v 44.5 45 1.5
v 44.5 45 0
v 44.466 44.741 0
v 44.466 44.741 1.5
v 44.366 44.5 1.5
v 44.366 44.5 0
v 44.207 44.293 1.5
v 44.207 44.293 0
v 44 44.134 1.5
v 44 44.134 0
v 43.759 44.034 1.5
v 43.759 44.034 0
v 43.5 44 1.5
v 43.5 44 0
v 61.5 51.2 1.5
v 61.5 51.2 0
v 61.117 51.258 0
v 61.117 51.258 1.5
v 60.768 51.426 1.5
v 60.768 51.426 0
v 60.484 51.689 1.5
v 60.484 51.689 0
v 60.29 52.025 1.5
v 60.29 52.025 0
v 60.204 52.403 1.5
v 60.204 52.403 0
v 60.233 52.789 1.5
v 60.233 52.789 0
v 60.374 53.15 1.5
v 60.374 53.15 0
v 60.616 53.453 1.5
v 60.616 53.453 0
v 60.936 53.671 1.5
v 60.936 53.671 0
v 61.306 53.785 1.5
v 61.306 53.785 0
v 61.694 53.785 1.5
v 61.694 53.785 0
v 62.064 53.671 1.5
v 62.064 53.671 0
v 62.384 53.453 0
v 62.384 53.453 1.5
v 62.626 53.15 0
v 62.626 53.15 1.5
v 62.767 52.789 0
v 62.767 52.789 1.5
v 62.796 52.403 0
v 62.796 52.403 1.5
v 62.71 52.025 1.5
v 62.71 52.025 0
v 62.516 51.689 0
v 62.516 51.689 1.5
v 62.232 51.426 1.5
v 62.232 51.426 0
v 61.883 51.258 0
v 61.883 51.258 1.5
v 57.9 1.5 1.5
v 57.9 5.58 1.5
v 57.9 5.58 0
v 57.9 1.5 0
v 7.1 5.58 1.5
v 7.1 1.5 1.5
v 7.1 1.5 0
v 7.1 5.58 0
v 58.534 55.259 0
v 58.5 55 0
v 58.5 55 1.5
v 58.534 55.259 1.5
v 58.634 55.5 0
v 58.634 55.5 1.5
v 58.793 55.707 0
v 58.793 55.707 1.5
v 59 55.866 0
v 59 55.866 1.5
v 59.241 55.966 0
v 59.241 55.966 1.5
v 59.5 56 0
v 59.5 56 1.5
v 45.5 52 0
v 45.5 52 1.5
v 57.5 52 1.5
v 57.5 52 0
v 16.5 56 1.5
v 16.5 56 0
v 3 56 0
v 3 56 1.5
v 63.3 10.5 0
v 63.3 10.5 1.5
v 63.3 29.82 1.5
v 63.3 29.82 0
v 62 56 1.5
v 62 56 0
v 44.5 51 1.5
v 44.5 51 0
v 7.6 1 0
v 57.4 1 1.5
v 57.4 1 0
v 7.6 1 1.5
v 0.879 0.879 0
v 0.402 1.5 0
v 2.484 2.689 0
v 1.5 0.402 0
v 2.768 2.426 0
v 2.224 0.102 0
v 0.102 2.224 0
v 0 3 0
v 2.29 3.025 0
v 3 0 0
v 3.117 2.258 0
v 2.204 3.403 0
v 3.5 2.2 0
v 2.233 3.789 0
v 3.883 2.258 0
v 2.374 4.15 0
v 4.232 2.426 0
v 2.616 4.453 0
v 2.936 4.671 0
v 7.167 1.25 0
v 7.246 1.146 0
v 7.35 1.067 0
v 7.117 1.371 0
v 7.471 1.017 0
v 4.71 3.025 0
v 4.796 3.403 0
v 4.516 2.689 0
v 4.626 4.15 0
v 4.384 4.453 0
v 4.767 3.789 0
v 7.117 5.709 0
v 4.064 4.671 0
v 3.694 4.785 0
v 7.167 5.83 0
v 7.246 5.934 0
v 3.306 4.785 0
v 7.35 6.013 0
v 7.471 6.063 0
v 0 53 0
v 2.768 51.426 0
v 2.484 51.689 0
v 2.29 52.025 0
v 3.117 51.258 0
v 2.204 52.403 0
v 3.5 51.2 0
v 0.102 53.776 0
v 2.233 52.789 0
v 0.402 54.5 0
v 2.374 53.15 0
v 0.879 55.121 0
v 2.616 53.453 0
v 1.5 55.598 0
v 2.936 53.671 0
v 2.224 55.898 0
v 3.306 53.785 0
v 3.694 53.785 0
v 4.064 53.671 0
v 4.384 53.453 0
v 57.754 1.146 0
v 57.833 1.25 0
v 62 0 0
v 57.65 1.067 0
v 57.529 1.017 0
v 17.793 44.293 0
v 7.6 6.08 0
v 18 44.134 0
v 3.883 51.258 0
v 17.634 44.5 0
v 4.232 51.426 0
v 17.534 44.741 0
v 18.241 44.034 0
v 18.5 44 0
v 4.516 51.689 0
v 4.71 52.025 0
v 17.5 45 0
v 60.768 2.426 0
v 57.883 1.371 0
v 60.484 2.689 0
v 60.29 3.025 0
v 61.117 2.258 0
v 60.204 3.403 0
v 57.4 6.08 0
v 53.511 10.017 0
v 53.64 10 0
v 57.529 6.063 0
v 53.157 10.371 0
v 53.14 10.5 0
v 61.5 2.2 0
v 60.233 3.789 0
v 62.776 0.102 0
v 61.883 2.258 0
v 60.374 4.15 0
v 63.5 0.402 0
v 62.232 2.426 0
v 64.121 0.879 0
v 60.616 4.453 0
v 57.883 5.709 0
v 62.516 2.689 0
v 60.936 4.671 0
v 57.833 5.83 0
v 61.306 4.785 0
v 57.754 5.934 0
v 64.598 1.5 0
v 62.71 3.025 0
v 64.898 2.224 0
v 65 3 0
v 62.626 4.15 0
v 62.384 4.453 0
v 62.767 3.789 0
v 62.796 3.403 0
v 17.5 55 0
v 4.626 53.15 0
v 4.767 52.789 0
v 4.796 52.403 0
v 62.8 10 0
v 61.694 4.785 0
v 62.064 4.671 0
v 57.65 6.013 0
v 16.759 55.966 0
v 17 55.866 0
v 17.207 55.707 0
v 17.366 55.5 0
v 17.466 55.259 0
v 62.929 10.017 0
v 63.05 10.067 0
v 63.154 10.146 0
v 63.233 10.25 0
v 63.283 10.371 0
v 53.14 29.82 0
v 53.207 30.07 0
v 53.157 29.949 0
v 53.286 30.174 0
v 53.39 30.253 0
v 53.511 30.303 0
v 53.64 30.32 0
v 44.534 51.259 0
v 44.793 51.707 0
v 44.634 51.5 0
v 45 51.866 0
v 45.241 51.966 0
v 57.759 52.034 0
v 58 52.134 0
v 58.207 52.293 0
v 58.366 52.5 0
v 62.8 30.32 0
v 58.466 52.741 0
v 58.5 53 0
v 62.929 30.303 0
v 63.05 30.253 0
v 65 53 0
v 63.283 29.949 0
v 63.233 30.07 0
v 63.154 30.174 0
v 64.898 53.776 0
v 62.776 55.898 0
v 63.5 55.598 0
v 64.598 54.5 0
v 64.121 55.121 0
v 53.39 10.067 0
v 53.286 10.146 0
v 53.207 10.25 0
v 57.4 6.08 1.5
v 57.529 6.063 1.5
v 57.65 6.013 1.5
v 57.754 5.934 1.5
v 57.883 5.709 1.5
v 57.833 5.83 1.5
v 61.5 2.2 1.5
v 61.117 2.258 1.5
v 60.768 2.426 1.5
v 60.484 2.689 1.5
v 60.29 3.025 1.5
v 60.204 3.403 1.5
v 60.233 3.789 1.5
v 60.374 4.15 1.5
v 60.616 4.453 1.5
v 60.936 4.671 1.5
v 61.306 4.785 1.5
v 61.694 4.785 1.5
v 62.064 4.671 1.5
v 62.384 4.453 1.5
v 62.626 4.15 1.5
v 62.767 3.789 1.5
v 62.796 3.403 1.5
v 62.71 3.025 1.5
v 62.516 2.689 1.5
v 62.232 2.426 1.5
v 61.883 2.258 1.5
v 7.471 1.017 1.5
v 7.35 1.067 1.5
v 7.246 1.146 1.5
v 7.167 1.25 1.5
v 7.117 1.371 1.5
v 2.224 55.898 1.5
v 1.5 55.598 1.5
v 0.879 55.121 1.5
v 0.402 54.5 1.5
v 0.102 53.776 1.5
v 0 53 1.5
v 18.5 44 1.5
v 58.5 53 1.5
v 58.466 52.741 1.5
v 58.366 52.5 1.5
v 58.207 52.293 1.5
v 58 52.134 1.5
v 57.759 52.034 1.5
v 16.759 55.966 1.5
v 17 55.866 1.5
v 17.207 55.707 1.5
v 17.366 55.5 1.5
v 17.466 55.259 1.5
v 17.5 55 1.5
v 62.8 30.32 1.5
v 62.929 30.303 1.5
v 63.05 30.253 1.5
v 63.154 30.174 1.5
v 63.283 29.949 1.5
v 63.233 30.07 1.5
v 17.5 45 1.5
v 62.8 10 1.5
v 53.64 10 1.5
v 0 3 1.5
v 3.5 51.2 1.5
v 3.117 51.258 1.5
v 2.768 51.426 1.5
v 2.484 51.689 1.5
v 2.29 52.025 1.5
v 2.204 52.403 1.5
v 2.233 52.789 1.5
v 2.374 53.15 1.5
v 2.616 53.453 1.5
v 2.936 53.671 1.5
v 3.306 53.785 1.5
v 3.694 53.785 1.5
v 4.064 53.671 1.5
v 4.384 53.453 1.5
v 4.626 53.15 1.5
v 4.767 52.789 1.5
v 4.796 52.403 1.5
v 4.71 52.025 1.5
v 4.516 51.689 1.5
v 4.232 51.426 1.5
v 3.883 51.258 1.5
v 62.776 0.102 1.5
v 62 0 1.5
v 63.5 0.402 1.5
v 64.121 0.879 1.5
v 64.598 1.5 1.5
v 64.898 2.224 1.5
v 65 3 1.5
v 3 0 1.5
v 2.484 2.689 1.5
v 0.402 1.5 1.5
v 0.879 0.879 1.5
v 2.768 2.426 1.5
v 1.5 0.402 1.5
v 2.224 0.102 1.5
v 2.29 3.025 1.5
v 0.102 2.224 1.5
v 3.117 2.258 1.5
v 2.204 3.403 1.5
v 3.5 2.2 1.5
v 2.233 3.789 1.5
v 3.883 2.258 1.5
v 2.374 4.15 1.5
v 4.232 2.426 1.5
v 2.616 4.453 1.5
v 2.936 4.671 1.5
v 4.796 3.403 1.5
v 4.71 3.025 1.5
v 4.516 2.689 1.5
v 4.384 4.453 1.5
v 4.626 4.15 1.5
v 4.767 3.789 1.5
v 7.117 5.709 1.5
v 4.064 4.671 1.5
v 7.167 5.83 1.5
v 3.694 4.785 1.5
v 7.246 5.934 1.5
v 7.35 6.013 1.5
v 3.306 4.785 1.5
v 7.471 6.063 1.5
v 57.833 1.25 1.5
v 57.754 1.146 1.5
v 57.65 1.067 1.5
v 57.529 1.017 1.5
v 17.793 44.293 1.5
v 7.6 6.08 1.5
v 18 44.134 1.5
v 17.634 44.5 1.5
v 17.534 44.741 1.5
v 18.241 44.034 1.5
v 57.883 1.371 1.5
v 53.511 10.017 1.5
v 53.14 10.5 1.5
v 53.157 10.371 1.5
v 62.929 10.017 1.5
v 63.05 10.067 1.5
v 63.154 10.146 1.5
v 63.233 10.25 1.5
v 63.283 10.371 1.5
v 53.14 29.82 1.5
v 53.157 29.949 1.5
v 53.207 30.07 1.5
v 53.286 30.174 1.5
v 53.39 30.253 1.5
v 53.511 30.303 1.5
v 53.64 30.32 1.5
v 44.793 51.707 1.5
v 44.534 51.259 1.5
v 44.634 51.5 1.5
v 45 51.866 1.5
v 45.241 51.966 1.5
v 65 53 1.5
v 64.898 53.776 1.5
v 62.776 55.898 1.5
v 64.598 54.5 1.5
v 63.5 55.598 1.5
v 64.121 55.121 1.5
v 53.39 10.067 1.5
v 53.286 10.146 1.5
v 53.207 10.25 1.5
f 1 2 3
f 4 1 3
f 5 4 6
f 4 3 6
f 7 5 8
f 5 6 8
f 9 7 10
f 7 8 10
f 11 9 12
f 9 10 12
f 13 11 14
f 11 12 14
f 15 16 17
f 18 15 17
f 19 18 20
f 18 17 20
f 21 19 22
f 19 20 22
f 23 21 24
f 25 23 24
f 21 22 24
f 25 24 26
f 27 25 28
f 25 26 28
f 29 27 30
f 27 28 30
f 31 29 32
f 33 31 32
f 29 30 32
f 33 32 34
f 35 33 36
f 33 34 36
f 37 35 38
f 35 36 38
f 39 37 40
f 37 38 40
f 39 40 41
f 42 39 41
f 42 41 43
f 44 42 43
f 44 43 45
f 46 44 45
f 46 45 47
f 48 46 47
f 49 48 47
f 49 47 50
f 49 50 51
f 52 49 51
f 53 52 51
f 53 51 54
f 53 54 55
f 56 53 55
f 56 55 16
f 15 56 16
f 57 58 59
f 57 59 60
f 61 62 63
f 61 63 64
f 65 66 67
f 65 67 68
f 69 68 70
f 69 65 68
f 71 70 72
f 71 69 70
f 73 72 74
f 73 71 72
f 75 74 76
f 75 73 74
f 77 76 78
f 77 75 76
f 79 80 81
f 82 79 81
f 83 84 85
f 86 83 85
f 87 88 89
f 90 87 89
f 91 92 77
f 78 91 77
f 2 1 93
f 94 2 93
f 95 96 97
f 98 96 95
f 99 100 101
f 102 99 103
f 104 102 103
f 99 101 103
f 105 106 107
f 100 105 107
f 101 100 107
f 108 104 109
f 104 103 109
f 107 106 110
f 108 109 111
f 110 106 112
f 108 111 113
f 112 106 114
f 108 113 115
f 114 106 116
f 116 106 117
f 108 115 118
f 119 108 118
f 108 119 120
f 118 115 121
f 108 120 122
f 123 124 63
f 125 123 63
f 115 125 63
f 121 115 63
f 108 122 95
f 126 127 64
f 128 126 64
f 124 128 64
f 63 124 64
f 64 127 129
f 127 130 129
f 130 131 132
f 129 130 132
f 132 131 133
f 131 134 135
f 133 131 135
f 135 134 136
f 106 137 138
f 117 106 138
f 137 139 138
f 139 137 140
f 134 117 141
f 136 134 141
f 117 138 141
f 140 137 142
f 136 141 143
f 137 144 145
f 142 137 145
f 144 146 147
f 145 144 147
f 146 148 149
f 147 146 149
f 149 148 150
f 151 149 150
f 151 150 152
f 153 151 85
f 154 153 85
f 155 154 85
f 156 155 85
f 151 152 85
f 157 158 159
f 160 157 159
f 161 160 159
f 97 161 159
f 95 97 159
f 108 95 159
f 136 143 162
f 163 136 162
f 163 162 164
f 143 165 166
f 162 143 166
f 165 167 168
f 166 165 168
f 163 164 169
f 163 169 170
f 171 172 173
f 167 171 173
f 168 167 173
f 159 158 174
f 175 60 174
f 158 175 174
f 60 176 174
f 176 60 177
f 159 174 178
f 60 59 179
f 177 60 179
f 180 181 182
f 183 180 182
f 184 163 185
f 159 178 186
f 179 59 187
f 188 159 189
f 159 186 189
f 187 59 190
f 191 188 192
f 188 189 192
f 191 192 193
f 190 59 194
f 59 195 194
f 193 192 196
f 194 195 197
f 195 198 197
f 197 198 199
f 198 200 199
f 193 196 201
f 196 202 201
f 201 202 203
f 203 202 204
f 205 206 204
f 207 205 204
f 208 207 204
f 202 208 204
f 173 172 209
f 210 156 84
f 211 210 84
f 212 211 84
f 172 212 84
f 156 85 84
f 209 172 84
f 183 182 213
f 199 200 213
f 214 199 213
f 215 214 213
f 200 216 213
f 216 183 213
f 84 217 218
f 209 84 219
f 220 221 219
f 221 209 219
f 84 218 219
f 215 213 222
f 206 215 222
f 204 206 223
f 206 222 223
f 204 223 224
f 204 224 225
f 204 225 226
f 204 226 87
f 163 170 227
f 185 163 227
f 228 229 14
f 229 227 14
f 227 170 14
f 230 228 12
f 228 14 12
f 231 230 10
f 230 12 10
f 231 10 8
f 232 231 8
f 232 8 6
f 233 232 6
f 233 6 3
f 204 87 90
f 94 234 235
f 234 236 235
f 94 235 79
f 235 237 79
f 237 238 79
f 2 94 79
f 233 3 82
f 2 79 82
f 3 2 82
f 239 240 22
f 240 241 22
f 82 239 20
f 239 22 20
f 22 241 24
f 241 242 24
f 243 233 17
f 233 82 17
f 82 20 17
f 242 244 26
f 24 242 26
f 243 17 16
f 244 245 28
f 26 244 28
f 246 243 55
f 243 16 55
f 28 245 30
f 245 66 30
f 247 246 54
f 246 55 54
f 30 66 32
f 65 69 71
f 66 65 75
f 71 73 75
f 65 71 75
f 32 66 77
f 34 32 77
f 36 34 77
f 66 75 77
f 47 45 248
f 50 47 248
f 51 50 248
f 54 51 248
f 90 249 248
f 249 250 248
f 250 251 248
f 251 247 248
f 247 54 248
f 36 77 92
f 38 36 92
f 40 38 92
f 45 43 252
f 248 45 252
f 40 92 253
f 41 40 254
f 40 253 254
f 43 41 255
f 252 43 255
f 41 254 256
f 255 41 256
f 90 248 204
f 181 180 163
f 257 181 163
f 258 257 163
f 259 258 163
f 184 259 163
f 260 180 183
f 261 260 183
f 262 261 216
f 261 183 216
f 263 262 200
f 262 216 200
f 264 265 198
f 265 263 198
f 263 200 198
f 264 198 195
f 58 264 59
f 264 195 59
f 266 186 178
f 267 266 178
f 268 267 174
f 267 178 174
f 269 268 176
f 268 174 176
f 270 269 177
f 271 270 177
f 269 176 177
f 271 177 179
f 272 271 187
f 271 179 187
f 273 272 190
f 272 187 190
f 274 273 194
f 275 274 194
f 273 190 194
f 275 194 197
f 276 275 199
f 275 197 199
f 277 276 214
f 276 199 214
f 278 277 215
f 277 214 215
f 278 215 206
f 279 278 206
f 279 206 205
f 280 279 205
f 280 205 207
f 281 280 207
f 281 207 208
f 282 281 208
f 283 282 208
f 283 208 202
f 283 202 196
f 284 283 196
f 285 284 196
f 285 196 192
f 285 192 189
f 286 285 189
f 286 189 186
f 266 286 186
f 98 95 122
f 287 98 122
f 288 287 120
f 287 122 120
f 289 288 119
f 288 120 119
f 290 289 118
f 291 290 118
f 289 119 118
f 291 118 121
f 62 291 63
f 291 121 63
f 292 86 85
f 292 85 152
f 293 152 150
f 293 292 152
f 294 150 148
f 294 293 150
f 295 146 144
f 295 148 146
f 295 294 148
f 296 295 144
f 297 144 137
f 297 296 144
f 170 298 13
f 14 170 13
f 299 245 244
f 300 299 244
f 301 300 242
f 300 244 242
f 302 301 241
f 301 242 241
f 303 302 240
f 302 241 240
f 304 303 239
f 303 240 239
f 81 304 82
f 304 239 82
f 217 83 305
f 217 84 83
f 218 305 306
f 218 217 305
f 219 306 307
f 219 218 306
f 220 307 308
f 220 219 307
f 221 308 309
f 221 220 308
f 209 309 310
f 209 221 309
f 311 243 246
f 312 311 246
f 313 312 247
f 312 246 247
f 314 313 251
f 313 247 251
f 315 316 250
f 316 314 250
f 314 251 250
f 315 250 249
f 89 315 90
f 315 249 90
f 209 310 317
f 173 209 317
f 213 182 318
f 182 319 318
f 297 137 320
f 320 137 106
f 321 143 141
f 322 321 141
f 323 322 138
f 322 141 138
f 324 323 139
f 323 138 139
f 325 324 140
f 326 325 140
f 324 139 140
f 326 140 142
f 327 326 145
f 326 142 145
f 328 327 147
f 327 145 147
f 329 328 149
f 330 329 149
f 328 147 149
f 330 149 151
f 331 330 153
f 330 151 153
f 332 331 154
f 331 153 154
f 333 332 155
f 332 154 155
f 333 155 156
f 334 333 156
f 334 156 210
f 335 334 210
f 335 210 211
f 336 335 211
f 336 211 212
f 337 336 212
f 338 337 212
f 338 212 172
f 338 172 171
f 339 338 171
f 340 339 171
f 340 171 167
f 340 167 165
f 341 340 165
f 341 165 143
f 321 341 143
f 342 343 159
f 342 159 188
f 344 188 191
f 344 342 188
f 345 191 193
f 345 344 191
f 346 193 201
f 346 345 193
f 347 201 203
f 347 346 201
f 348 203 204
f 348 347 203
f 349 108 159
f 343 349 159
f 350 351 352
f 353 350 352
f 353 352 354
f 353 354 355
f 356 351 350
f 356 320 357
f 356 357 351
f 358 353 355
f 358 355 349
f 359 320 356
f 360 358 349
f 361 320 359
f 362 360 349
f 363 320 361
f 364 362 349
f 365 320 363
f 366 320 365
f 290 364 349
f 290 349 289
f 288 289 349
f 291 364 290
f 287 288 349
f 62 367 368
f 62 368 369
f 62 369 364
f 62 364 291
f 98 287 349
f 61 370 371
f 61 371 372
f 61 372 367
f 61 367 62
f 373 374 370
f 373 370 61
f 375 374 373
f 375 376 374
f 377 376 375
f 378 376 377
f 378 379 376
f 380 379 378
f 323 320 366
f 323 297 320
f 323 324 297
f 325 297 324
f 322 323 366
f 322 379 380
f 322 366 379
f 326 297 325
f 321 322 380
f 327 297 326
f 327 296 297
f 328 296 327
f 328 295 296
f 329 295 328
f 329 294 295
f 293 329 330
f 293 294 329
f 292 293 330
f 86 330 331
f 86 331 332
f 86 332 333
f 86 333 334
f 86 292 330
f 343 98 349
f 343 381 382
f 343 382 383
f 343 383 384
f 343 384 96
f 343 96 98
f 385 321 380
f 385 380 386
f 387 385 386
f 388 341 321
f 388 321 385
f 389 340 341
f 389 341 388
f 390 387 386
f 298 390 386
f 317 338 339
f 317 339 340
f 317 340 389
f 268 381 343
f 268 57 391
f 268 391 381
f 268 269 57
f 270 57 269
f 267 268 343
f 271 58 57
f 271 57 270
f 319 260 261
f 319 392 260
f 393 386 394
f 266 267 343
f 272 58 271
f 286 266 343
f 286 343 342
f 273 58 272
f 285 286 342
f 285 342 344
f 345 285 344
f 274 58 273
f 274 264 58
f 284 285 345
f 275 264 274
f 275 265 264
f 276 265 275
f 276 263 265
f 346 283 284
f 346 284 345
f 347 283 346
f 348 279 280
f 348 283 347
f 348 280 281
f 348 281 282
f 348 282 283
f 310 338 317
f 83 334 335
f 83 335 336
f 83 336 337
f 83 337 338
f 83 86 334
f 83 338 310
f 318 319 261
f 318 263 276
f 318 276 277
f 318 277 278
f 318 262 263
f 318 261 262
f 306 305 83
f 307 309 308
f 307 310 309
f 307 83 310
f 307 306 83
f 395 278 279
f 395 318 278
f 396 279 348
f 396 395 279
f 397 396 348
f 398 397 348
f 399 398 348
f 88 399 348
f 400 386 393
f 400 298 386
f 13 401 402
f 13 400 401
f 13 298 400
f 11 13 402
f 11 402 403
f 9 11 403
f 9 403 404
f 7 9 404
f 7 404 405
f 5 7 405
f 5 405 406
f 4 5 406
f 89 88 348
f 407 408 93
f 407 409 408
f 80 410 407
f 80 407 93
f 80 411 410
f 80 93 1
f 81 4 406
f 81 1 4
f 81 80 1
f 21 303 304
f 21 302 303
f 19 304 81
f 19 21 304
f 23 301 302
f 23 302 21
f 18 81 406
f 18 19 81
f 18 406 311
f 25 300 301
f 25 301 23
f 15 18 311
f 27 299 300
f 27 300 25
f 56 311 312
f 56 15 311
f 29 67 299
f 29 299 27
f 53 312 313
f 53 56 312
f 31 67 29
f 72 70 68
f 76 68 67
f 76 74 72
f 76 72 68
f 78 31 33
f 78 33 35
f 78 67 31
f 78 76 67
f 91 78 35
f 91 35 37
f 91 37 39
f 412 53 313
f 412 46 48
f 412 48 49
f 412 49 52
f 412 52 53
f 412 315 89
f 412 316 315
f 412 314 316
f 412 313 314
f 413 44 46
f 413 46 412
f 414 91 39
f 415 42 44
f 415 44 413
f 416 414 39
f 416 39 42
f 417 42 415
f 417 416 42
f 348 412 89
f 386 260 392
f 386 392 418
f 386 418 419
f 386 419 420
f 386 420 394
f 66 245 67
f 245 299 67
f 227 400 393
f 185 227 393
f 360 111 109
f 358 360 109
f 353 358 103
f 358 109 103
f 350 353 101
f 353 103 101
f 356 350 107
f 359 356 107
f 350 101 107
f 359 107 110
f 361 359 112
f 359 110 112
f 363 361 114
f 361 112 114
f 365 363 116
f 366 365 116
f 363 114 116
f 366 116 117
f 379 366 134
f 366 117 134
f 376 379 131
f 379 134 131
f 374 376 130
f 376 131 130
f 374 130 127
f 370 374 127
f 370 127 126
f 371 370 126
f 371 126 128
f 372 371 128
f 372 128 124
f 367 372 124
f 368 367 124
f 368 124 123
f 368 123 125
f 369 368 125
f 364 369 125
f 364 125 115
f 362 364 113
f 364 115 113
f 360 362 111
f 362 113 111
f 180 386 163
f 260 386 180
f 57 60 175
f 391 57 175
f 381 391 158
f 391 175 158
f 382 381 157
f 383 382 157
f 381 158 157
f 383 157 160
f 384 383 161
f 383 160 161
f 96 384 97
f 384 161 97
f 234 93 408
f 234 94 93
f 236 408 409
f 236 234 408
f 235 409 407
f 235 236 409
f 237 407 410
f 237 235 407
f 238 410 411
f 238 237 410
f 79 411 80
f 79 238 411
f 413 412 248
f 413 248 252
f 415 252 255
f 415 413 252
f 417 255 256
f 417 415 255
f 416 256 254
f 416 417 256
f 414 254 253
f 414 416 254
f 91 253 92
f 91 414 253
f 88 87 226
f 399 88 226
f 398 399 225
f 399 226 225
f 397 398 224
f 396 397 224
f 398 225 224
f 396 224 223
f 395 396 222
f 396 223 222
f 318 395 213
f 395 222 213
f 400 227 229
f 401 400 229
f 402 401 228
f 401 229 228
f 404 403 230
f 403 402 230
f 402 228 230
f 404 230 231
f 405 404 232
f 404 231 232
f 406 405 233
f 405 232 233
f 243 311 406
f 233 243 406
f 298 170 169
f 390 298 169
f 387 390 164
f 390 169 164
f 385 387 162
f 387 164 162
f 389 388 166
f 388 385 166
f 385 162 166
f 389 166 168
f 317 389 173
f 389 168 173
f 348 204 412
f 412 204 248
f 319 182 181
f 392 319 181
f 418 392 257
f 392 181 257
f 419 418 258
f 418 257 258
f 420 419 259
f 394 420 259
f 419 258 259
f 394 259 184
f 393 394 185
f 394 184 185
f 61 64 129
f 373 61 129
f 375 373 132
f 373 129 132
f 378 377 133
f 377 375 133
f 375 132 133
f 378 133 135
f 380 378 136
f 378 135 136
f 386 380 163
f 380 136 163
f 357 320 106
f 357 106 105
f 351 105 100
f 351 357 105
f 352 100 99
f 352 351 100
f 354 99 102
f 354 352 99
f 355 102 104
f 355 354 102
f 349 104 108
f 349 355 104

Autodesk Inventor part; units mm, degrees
ref_plane "YZ Plane" through (0, 0, 0) normal (1, 0, 0) x (0, 1, 0)
ref_plane "XZ Plane" through (0, 0, 0) normal (0, 1, 0) x (-1, 0, 0)
ref_plane "XY Plane" through (0, 0, 0) normal (0, 0, 1) x (1, 0, 0)
sketch "スケッチ1" plane through (0, 0, 0) normal (0, 0, 1) x (1, 0, 0)
  line L0 (0, 0) -> (65, 0)
  line L1 (65, 0) -> (65, 56)
  line L2 (65, 56) -> (0, 56)
  line L3 (0, 56) -> (0, 0)
  dimension "d0" = 56
  dimension "d1" = 65
extrude "押し出し1" add sketch "スケッチ1" along normal blind 1.5
sketch "スケッチ2" plane through (0, 0, 1.5) normal (0, 0, 1) x (1, 0, 0)
  line L0 (0, 0) -> (65, 0) projected
  line L1 (65, 0) -> (65, 56) projected
  line L2 (65, 56) -> (0, 56) projected
  line L3 (0, 56) -> (0, 0) projected
  line L4 (3.5, 52.5) -> (61.5, 52.5)
  line L5 (61.5, 52.5) -> (61.5, 3.5)
  line L6 (61.5, 3.5) -> (3.5, 3.5)
  line L7 (3.5, 3.5) -> (3.5, 52.5)
  dimension "d4" = 3.5
hole "穴1" at (61.5, 52.5, 1.5) at (61.5, 3.5, 1.5) at (3.5, 3.5, 1.5) at (3.5, 52.5, 1.5) direction (0, 0, -1) diameter 2.6 end through all
fillet "フィレット1" radius 3 4 edges at (0, 56, 0.75) (65, 56, 0.75) (65, 0, 0.75) (0, 0, 0.75)
sketch "スケッチ3" plane through (0, 0, 1.5) normal (0, 0, 1) x (1, 0, 0)
  arc A0 (0, 3) -> (3, 0) centre (3, 3) ccw projected
  line L0 (3, 0) -> (62, 0) projected
  arc A1 (62, 0) -> (65, 3) centre (62, 3) ccw projected
  line L1 (65, 3) -> (65, 53) projected
  arc A2 (65, 53) -> (62, 56) centre (62, 53) ccw projected
  line L2 (62, 56) -> (3, 56) projected
  arc A3 (3, 56) -> (0, 53) centre (3, 53) ccw projected
  line L3 (0, 53) -> (0, 3) projected
  circle A4 centre (3.5, 3.5) radius 1.3 projected
  circle A5 centre (61.5, 52.5) radius 1.3 projected
  circle A6 centre (61.5, 3.5) radius 1.3 projected
  circle A7 centre (3.5, 52.5) radius 1.3 projected
  line L4 (63.3, 30.32) -> (53.14, 30.32)
  line L5 (53.14, 30.32) -> (53.14, 10)
  line L6 (53.14, 10) -> (63.3, 10)
  line L7 (63.3, 10) -> (63.3, 30.32)
  point P0 (0, 0)
  dimension "d13" = 20.32
  dimension "d14" = 10.16
  dimension "d23" = 1.7
  dimension "d24" = 10
extrude "押し出し2" cut sketch "スケッチ3" against normal through all contours L7 L6 L5 L4
sketch "スケッチ4" plane through (0, 0, 1.5) normal (0, 0, 1) x (1, 0, 0)
  line L0 (53.14, 10) -> (53.14, 30.32) projected
  line L1 (53.14, 30.32) -> (63.3, 30.32) projected
  line L2 (63.3, 30.32) -> (63.3, 10) projected
  line L3 (63.3, 10) -> (53.14, 10) projected
  arc A0 (0, 3) -> (3, 0) centre (3, 3) ccw projected
  line L4 (3, 0) -> (62, 0) projected
  arc A1 (62, 0) -> (65, 3) centre (62, 3) ccw projected
  line L5 (65, 3) -> (65, 53) projected
  arc A2 (65, 53) -> (62, 56) centre (62, 53) ccw projected
  line L6 (62, 56) -> (3, 56) projected
  arc A3 (3, 56) -> (0, 53) centre (3, 53) ccw projected
  line L7 (0, 53) -> (0, 3) projected
  circle A4 centre (3.5, 3.5) radius 1.3 projected
  circle A5 centre (61.5, 52.5) radius 1.3 projected
  circle A6 centre (61.5, 3.5) radius 1.3 projected
  circle A7 centre (3.5, 52.5) radius 1.3 projected
  line L8 (57.9, 1) -> (7.1, 1)
  line L9 (7.1, 1) -> (7.1, 6.08)
  line L10 (7.1, 6.08) -> (57.9, 6.08)
  line L11 (57.9, 6.08) -> (57.9, 1)
  point P0 (0, 0)
  dimension "d17" = 5.08
  dimension "d18" = 1
  dimension "d21" = 7.1
  dimension "d22" = 50.8
extrude "押し出し3" cut sketch "スケッチ4" against normal through all contours L8 L9 L10 L11
sketch "スケッチ5" plane through (0, 0, 1.5) normal (0, 0, 1) x (1, 0, 0)
  line L0 (57.9, 6.08) -> (57.9, 1) projected
  line L1 (57.9, 1) -> (7.1, 1) projected
  line L2 (7.1, 1) -> (7.1, 6.08) projected
  line L3 (7.1, 6.08) -> (57.9, 6.08) projected
  line L4 (53.14, 10) -> (53.14, 30.32) projected
  line L5 (53.14, 30.32) -> (63.3, 30.32) projected
  line L6 (63.3, 30.32) -> (63.3, 10) projected
  line L7 (63.3, 10) -> (53.14, 10) projected
  arc A0 (0, 3) -> (3, 0) centre (3, 3) ccw projected
  line L8 (3, 0) -> (62, 0) projected
  arc A1 (62, 0) -> (65, 3) centre (62, 3) ccw projected
  line L9 (65, 3) -> (65, 53) projected
  arc A2 (65, 53) -> (62, 56) centre (62, 53) ccw projected
  line L10 (62, 56) -> (3, 56) projected
  arc A3 (3, 56) -> (0, 53) centre (3, 53) ccw projected
  line L11 (0, 53) -> (0, 3) projected
  circle A4 centre (3.5, 3.5) radius 1.3 projected
  circle A5 centre (61.5, 52.5) radius 1.3 projected
  circle A6 centre (61.5, 3.5) radius 1.3 projected
  circle A7 centre (3.5, 52.5) radius 1.3 projected
  line L12 (58.5, 56) -> (44.5, 56)
  line L13 (44.5, 56) -> (44.5, 52)
  line L14 (44.5, 52) -> (58.5, 52)
  line L15 (58.5, 52) -> (58.5, 56)
  line L16 (17.5, 44) -> (44.5, 44)
  line L17 (44.5, 44) -> (44.5, 56)
  line L18 (44.5, 56) -> (17.5, 56)
  line L19 (17.5, 56) -> (17.5, 44)
  point P0 (0, 0)
  dimension "d25" = 3
  dimension "d26" = 4
  dimension "d27" = 14
  dimension "d28" = 27
  dimension "d29" = 12
extrude "押し出し4" cut sketch "スケッチ5" against normal through all contours L10 L13 L17 L16 L19 | L10 L15 L14 L13
fillet "フィレット2" radius 1 3 edges at (58.5, 56, 0.75) (44.5, 52, 0.75) (17.5, 56, 0.75)
fillet "フィレット2" radius 1 3 edges at (58.5, 52, 0.75) (44.5, 44, 0.75) (17.5, 44, 0.75)
fillet "フィレット3" radius 0.5 8 edges at (57.9, 1, 0.75) (57.9, 6.08, 0.75) (63.3, 10, 0.75) (53.14, 10, 0.75) (53.14, 30.32, 0.75) (63.3, 30.32, 0.75) (7.1, 1, 0.75) (7.1, 6.08, 0.75)
properties part number "ボードガード" material "アルミニウム 6061"
